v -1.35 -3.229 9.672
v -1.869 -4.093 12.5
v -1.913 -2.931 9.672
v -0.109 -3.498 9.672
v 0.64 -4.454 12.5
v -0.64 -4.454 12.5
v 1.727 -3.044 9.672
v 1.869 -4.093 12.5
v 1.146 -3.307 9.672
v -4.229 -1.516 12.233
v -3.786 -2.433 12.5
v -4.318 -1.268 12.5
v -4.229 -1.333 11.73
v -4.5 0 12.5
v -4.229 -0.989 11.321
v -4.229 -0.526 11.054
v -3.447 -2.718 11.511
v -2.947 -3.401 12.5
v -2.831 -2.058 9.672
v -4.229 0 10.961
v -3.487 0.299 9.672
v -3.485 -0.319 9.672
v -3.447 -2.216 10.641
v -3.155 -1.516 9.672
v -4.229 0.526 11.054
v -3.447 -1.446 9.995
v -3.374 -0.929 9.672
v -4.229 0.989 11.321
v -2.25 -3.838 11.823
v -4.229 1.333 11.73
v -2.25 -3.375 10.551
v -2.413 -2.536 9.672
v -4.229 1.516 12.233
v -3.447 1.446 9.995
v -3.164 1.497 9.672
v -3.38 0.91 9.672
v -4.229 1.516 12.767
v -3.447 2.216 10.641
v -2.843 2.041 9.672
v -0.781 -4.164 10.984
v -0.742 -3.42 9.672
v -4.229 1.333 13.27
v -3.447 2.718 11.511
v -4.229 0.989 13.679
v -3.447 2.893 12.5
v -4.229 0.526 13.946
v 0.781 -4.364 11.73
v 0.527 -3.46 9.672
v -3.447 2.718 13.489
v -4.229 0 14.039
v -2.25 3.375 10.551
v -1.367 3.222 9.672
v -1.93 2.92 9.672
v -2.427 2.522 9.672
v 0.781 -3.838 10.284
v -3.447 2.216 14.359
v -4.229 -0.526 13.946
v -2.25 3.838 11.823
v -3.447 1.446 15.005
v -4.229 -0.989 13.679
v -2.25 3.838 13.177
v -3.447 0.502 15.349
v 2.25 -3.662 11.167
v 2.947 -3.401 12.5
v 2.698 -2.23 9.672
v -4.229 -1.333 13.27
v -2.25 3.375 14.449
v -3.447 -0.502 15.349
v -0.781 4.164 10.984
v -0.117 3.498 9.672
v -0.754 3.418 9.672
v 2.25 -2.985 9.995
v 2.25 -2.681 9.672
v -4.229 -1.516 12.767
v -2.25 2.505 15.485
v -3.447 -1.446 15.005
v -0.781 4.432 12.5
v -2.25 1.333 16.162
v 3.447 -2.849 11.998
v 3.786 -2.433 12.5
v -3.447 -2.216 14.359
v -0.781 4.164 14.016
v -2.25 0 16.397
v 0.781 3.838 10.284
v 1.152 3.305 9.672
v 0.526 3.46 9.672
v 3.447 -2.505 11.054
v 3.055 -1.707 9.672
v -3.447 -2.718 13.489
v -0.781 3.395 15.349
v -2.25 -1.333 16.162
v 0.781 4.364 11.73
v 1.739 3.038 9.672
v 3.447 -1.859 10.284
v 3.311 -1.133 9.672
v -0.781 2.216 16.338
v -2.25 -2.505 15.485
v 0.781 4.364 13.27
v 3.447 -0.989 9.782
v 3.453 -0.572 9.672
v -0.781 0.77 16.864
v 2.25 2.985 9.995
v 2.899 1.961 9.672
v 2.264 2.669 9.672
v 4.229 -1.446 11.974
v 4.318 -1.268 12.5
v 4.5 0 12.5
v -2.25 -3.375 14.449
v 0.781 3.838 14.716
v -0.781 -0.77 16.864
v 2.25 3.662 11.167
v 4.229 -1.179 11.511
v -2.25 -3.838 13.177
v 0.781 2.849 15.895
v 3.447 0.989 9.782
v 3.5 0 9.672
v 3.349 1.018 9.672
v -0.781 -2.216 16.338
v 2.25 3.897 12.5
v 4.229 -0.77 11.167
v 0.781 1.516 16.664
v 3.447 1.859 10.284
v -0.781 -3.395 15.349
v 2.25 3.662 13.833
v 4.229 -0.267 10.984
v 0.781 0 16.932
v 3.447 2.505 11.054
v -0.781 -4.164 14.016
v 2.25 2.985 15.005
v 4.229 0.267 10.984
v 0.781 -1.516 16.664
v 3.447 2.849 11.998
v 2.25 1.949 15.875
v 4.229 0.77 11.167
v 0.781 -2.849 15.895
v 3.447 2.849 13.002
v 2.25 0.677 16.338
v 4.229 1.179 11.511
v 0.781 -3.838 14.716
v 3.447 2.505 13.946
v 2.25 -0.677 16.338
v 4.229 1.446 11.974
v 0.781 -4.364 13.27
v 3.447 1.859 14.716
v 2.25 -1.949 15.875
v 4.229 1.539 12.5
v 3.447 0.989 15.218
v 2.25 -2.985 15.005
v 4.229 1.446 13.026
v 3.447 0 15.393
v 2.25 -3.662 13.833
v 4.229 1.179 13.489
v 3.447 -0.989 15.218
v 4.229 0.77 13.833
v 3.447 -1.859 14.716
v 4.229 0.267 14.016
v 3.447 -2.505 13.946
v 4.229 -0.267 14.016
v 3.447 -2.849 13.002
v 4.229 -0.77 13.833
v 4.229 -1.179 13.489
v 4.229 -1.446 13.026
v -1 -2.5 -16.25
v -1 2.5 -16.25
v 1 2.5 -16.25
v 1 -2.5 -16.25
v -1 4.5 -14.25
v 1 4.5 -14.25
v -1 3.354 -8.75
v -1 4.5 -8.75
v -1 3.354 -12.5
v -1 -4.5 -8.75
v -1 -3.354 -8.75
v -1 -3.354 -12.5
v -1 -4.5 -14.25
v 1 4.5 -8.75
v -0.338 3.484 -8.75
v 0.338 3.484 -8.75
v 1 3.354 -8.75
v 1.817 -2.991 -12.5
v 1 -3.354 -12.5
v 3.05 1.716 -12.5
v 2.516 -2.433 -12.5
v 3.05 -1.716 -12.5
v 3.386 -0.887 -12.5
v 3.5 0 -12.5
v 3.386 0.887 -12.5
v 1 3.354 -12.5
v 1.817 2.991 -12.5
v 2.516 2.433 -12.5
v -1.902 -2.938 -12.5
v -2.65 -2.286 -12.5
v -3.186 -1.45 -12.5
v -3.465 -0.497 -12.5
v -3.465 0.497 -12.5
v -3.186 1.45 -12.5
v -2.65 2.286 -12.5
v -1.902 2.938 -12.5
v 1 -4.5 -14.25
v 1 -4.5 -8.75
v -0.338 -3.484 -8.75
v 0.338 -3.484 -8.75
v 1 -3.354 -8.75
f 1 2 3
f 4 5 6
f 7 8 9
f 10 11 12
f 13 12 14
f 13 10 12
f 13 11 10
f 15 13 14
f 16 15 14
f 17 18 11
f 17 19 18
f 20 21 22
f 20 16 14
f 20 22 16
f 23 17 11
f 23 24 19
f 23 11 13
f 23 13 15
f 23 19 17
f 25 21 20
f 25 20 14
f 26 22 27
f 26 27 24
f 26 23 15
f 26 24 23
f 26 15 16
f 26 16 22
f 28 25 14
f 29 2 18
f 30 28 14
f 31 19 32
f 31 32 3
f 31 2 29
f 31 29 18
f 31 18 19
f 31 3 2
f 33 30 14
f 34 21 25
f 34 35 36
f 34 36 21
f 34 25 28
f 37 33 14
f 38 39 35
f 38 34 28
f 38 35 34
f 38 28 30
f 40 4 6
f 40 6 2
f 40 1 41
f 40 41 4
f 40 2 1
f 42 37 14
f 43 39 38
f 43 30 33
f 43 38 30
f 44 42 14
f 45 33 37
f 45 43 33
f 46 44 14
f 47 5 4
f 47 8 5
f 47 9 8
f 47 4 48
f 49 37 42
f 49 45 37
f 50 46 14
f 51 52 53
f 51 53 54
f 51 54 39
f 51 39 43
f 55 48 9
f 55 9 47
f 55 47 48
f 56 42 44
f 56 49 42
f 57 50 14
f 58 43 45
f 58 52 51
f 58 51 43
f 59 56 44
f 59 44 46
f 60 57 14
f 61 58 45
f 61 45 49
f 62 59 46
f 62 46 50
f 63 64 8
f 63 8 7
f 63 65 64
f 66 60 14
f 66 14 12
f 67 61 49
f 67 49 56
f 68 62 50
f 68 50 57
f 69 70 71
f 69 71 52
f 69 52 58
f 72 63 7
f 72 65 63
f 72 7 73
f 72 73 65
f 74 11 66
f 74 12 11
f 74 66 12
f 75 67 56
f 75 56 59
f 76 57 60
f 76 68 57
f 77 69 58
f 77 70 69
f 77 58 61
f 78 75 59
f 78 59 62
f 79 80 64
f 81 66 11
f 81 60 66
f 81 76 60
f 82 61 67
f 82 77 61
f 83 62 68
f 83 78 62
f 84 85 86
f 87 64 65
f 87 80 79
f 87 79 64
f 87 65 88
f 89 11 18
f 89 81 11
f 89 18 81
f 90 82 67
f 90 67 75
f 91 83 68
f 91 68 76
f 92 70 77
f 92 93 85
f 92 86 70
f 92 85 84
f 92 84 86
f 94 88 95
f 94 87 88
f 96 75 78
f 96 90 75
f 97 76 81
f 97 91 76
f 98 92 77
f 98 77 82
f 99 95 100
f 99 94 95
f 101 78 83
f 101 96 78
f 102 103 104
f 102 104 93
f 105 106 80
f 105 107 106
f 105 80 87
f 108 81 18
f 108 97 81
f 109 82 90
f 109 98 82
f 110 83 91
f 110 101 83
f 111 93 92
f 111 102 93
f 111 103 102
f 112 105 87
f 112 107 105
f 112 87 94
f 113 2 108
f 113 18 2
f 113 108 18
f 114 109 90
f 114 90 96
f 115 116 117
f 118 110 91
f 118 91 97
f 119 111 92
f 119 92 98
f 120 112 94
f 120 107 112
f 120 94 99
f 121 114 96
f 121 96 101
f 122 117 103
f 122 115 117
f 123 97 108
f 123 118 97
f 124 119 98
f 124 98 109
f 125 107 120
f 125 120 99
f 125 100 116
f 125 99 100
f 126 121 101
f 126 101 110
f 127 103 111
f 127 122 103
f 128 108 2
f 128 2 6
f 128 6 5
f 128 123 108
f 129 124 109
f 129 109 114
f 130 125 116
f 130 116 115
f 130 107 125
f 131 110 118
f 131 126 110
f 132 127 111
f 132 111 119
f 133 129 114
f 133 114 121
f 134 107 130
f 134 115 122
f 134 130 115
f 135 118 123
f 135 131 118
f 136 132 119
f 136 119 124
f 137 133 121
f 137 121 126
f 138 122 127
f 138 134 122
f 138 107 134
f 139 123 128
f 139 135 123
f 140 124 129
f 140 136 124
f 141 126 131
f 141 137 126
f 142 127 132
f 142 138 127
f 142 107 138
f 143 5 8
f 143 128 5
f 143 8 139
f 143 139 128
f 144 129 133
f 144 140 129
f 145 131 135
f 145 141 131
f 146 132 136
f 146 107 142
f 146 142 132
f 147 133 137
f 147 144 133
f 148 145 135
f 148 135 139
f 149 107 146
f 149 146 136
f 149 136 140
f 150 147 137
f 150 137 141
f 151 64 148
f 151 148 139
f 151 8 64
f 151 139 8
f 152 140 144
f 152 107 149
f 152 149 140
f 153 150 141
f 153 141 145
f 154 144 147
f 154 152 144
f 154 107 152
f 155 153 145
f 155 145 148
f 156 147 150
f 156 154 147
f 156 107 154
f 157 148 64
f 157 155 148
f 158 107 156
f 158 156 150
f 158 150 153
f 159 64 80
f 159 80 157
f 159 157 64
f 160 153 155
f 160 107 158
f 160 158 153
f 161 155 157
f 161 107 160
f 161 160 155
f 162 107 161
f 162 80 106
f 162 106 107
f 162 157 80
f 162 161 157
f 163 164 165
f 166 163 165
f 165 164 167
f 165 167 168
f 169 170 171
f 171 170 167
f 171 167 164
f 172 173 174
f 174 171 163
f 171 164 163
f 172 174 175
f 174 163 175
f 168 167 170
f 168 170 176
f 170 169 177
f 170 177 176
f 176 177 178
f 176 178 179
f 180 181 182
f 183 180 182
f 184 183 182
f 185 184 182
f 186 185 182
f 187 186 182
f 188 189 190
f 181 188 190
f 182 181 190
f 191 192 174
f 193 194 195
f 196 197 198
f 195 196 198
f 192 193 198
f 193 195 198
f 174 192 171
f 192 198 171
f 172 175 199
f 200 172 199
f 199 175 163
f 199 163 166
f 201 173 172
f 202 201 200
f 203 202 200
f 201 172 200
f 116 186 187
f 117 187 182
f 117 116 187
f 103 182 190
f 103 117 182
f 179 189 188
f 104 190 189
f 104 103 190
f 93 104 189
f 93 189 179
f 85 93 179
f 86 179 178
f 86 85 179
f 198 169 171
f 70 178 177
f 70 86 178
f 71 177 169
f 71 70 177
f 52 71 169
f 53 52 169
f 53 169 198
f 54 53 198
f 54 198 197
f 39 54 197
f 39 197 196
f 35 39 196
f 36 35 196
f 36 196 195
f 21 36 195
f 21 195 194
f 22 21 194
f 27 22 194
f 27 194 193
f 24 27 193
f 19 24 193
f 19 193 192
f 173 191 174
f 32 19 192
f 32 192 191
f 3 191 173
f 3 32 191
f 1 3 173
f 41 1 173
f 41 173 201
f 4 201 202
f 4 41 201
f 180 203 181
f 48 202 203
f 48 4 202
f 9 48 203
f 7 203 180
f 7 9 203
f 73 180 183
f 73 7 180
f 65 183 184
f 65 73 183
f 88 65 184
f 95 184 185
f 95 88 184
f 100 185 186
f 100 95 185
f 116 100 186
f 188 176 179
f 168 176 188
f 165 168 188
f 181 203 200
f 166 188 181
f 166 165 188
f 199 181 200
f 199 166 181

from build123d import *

# Parameters (mm, degrees)
F0_R     = 3.5
F1_DEPTH = 12.5
F2_W     = 2
F2_H     = 9
F3_DEPTH = 3.75
F7_SIZE  = 2


with BuildPart() as f1:
    # F0 (on Top) → F1 (new body, symmetric)
    with BuildSketch(Plane.XY):
        Circle(F0_R)
    extrude(amount=F1_DEPTH, both=True)

    # F2 (on face) → F3 (join, symmetric)
    with BuildSketch(Plane(origin=(0, 0, -12.5), x_dir=(1, 0, 0), z_dir=(0, 0, -1))):
        Rectangle(F2_W, F2_H)
    extrude(amount=F3_DEPTH, both=True)

    # F5 (on face) → F6 (revolve)
    with BuildSketch(Plane.XY.offset(12.5)):
        with BuildLine():
            Line((4.5, 0), (-4.5, 0))
            ThreePointArc((-4.5, 0), (0, -4.5), (4.5, 0))
        make_face()
    revolve(axis=Axis((-0.09783, 0, 12.5), (1, 0, 0)))

    # F7
    f7_edges = [f1.edges().sort_by_distance(p)[0] for p in [
        (0, -4.5, -16.25),
        (0, 4.5, -16.25),
    ]]
    chamfer(f7_edges, length=F7_SIZE)


solid = f1.part
